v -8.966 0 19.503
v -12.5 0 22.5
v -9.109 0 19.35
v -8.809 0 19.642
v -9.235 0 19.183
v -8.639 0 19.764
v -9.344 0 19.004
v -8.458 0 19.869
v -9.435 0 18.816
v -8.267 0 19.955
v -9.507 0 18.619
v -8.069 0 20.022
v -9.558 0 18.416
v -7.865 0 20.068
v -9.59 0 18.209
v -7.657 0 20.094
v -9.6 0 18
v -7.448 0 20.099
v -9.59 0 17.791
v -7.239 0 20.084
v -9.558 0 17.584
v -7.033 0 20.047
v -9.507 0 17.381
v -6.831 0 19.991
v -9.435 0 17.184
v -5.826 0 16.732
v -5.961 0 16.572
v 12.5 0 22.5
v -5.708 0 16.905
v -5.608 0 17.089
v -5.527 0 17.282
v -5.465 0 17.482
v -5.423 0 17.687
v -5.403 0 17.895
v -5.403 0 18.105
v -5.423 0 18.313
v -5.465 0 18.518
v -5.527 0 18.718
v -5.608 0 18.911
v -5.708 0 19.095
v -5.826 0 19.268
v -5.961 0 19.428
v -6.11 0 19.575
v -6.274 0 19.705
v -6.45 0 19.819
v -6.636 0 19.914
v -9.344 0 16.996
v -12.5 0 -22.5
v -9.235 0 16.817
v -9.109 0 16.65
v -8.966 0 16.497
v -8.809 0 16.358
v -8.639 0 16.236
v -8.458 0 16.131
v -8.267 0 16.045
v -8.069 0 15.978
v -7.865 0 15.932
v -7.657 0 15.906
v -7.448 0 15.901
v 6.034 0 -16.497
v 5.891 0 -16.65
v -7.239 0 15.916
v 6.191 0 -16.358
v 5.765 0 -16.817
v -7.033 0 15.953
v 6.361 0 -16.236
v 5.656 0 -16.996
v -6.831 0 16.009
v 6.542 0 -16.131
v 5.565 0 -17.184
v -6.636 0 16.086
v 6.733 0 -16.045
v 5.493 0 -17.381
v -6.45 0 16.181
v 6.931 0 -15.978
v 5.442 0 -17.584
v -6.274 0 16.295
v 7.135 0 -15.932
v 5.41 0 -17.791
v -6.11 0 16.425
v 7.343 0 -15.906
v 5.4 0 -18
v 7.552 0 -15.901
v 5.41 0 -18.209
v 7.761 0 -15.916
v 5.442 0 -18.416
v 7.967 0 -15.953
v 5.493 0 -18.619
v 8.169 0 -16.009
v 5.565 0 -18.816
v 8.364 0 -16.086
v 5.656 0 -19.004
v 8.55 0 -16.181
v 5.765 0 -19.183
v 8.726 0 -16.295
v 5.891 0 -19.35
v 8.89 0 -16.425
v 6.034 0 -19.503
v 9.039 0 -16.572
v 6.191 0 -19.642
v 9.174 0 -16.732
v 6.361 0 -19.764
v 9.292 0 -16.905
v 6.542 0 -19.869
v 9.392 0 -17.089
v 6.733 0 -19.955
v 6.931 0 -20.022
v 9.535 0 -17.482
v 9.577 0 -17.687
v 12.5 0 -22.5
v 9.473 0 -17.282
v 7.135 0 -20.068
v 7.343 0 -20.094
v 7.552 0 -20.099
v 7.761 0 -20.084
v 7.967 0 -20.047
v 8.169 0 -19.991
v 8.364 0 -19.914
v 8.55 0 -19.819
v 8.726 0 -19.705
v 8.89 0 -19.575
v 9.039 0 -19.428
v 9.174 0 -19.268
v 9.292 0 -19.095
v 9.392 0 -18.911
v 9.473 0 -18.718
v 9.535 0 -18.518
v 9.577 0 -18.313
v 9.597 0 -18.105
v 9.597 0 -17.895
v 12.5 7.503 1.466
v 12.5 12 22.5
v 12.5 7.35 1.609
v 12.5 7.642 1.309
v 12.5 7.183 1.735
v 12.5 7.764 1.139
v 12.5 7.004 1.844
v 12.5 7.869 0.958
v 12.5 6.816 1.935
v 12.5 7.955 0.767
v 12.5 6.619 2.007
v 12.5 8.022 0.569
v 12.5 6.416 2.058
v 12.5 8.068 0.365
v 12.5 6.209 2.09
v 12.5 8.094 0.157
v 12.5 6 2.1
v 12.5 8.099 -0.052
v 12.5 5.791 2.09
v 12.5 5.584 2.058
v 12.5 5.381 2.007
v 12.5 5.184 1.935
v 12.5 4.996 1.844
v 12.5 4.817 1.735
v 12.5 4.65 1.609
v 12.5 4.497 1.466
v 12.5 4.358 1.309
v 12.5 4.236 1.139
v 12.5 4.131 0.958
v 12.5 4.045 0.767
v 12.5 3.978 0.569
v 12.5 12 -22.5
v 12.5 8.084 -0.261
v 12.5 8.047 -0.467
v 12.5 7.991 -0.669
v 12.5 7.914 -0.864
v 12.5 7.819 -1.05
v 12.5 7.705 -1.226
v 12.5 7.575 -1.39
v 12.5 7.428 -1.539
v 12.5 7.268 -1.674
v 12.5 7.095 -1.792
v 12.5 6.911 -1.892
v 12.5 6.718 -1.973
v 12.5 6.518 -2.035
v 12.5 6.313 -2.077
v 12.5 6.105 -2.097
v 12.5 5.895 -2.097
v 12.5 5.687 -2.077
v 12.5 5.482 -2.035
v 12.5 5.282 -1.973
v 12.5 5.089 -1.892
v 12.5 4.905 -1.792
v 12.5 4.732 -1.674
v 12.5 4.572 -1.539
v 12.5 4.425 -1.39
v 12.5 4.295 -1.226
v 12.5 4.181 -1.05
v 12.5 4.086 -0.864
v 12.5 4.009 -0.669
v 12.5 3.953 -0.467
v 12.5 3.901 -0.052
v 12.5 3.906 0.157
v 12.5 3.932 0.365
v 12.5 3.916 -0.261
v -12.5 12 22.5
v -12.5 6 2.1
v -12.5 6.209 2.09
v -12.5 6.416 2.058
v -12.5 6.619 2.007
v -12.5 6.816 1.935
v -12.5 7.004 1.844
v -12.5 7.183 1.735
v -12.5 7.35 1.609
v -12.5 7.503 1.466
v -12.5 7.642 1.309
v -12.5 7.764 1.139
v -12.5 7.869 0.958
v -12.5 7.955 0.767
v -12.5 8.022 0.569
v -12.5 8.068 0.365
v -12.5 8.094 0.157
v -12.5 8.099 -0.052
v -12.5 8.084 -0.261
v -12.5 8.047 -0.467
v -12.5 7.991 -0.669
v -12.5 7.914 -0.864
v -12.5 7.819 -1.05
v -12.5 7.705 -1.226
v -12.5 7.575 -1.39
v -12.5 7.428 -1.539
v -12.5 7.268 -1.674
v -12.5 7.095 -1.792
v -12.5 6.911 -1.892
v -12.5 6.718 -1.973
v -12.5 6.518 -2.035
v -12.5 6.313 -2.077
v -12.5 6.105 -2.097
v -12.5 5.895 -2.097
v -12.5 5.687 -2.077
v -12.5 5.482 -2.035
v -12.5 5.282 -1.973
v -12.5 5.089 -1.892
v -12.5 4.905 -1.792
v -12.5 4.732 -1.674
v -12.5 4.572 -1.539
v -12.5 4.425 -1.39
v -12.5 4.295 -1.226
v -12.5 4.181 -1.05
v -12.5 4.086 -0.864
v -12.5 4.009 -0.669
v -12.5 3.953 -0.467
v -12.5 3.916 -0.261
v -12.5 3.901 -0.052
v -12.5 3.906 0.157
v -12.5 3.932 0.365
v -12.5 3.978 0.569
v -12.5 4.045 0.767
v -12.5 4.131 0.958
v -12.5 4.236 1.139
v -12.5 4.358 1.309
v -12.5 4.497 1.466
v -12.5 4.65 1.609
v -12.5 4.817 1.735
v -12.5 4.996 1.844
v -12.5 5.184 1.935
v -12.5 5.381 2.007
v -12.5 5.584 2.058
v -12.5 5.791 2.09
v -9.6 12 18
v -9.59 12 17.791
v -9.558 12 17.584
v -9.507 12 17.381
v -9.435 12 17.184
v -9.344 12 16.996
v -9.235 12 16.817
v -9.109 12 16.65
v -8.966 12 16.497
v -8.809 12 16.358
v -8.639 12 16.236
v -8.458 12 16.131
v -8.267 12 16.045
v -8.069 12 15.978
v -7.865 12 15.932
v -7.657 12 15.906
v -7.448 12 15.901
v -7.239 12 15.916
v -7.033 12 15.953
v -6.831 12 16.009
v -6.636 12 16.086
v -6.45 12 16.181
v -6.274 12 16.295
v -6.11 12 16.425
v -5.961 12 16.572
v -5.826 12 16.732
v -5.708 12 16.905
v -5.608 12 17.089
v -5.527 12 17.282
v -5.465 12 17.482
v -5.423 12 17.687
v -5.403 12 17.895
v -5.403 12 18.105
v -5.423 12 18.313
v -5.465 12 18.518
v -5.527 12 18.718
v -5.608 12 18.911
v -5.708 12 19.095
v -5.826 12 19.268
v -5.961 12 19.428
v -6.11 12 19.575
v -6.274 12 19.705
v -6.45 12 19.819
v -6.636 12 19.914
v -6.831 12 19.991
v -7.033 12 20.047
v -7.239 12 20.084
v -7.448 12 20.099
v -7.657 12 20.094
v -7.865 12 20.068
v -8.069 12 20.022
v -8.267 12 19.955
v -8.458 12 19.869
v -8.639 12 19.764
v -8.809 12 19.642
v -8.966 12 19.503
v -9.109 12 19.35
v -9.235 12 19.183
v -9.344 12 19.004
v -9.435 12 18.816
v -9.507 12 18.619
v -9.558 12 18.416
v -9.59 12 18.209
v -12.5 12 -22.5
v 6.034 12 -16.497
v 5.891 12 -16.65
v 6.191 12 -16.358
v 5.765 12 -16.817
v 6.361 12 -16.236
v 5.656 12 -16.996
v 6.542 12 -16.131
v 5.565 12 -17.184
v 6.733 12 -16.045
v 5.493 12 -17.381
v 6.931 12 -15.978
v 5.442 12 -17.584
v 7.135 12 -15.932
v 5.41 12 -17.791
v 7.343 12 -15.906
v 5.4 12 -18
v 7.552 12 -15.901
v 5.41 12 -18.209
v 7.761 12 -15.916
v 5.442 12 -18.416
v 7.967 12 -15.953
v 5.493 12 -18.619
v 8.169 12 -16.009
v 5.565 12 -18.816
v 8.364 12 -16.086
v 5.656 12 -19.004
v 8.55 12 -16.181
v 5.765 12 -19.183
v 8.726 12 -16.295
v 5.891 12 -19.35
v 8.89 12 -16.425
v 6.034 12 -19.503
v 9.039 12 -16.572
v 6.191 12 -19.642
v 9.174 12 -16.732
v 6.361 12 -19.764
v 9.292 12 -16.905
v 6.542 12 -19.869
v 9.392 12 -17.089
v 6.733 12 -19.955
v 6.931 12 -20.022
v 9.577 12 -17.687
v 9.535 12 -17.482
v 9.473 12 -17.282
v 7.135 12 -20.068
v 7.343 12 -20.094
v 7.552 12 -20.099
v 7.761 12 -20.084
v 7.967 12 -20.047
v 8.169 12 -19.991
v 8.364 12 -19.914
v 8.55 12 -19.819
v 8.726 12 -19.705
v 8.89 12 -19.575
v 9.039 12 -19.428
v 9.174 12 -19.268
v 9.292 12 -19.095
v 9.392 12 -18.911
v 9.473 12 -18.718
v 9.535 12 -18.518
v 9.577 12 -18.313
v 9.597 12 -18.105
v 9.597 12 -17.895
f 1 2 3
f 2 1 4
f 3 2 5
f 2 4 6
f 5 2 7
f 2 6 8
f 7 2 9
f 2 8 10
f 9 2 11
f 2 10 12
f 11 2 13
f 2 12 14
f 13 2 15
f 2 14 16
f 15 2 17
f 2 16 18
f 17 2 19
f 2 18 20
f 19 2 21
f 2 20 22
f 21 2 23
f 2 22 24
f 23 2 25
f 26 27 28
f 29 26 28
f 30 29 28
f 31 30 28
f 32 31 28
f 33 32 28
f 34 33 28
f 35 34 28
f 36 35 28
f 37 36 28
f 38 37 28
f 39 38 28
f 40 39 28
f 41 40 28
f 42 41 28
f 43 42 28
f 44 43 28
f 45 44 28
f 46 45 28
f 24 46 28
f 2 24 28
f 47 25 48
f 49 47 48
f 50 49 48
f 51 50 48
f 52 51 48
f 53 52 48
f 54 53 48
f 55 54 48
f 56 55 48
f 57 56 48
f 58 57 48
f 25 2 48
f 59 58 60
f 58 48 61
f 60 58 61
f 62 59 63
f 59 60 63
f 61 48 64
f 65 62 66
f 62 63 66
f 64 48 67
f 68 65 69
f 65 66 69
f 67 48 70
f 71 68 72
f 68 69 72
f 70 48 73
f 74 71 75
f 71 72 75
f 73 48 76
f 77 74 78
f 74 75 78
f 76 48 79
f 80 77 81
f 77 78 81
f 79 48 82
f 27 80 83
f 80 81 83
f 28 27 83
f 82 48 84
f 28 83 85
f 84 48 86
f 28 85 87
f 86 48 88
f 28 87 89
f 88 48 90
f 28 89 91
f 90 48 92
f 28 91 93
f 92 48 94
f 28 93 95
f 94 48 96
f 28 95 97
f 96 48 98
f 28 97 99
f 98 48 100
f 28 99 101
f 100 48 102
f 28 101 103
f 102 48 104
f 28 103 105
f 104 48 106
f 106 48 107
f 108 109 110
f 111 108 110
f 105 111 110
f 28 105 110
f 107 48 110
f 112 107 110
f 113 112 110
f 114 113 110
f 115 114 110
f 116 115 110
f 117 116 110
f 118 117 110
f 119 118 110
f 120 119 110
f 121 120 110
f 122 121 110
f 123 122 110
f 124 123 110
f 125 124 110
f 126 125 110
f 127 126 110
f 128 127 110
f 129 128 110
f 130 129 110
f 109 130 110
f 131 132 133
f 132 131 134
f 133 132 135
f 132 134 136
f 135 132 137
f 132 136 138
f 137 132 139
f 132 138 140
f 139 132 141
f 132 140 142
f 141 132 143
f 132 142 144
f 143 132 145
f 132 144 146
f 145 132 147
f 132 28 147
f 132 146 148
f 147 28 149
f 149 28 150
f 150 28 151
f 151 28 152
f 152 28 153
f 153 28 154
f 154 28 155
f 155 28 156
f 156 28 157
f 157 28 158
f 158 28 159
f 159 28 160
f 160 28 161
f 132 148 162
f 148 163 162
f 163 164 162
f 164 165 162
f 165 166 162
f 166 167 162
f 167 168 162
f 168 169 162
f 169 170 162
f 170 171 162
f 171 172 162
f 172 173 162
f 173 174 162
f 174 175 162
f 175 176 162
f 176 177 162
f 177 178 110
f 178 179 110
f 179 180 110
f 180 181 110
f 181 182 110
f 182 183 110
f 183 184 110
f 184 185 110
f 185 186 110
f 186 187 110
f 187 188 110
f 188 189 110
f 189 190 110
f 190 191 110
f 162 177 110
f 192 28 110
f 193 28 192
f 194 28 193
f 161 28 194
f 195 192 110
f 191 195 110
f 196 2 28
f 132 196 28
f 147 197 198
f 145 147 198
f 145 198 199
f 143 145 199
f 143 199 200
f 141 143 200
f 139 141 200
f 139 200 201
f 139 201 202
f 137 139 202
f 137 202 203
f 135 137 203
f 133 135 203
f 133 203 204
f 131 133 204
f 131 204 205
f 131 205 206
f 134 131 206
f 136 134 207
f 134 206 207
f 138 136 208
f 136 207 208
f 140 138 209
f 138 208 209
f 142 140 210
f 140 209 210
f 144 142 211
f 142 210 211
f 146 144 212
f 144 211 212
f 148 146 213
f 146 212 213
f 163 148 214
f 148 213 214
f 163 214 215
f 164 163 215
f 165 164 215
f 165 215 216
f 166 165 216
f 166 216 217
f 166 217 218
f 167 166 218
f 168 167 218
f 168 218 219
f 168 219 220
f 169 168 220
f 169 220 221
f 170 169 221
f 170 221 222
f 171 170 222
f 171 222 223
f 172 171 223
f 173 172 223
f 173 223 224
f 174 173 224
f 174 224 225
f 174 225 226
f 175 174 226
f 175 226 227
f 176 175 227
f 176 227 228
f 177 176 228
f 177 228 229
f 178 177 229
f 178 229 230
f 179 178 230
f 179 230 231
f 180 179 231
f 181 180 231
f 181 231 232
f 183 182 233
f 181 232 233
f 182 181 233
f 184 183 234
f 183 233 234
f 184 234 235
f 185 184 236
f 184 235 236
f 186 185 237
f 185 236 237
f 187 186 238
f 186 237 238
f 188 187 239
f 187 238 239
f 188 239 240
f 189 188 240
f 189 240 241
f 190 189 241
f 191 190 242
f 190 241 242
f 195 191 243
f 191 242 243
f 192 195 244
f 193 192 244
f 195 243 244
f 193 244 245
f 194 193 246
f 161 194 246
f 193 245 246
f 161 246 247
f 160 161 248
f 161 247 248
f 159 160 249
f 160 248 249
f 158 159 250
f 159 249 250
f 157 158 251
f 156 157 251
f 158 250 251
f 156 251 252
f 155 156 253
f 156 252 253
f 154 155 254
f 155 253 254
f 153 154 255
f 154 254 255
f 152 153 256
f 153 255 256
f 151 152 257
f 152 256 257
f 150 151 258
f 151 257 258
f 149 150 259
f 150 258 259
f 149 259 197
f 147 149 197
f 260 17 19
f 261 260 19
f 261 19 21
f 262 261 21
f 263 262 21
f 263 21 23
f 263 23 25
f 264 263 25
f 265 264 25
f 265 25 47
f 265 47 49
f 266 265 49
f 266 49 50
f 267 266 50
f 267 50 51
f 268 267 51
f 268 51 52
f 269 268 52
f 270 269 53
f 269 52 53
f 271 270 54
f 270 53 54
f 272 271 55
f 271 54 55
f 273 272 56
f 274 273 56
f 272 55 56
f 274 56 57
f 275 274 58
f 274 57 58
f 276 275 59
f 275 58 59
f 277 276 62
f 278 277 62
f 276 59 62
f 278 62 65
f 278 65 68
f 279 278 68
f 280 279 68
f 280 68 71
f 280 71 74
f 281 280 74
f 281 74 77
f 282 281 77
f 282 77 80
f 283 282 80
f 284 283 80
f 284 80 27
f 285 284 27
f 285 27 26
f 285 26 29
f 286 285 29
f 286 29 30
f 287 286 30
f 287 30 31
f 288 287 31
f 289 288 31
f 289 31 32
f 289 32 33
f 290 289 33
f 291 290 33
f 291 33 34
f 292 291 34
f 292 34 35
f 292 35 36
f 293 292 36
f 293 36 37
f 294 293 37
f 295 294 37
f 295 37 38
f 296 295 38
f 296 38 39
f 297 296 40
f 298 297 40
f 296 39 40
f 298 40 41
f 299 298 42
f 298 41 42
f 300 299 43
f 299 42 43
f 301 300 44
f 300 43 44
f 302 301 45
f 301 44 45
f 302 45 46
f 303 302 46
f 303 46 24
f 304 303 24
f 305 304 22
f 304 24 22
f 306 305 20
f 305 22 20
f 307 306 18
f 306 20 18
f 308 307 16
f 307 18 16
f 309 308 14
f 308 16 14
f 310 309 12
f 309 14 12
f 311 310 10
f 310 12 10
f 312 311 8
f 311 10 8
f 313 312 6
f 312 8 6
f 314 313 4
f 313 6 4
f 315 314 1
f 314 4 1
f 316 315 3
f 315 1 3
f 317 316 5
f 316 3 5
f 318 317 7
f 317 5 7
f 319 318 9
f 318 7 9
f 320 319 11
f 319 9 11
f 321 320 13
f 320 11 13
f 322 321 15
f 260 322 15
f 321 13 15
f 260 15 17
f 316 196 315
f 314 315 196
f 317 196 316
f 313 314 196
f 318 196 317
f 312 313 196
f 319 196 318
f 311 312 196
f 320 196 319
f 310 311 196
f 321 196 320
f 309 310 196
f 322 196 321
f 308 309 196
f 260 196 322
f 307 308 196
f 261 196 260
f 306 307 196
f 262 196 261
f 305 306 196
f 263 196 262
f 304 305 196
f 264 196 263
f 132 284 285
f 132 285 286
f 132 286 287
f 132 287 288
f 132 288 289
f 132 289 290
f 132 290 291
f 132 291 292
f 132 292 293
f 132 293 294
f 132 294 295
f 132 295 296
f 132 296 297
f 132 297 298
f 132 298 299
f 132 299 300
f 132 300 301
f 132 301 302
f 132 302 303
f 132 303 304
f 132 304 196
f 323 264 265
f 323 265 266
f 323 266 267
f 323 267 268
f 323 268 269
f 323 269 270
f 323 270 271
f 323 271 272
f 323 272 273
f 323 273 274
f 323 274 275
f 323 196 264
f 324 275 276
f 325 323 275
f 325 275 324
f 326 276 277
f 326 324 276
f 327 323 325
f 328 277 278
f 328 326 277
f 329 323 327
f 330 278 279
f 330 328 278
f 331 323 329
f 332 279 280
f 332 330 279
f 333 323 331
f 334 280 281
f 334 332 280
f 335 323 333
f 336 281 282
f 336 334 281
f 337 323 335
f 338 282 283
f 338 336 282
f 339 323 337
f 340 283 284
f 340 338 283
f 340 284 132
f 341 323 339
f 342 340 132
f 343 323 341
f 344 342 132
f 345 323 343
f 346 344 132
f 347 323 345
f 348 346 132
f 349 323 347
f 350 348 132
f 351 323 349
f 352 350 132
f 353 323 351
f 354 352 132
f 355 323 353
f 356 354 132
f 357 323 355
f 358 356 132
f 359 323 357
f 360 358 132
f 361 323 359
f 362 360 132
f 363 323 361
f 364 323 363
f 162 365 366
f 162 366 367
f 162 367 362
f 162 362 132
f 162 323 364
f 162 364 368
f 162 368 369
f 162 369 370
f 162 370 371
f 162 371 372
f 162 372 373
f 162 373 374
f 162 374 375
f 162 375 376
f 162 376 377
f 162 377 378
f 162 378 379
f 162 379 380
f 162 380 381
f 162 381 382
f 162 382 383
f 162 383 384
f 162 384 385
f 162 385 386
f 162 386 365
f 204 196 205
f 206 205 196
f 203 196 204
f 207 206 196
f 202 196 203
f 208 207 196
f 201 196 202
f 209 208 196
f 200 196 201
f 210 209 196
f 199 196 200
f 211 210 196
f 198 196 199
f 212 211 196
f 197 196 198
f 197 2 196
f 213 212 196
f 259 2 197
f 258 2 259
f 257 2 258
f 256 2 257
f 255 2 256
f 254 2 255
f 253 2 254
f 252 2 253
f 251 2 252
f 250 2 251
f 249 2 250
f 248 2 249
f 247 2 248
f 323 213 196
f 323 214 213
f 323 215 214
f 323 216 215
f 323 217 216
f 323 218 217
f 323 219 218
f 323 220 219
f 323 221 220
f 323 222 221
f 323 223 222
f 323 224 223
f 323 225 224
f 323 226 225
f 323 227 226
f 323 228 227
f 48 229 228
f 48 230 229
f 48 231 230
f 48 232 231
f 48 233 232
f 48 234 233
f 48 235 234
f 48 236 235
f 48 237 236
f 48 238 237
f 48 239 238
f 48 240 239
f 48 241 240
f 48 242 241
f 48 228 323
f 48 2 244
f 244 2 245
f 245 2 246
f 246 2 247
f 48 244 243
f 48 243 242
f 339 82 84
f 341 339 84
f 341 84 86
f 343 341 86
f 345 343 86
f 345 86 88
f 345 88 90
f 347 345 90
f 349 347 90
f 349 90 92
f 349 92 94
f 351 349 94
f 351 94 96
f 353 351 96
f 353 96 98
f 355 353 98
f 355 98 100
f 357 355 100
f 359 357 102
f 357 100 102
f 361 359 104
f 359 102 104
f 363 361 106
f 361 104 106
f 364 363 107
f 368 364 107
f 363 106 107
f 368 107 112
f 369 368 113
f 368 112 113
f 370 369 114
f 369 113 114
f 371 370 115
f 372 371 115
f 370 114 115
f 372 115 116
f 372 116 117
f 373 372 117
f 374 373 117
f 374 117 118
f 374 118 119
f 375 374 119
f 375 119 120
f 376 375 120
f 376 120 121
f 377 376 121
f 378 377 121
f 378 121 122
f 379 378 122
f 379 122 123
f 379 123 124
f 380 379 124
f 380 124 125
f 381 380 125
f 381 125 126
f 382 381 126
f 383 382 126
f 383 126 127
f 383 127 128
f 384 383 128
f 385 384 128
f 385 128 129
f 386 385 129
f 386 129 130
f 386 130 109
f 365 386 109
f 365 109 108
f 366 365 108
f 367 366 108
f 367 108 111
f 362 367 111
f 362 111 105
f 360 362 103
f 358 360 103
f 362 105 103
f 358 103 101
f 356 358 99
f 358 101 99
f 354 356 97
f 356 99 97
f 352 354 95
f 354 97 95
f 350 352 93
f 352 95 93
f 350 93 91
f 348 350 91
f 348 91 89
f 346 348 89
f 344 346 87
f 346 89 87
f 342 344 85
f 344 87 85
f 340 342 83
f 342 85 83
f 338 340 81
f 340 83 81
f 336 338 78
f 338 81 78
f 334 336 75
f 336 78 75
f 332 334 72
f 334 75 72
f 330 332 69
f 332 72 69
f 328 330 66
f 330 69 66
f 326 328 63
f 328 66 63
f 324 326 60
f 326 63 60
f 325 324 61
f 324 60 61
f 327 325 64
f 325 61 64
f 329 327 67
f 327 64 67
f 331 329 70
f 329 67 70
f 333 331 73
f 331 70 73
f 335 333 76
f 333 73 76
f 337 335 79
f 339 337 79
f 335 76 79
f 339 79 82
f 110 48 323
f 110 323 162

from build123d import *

# Parameters (mm, degrees)
SKETCH1_W           = 25
SKETCH1_H           = 45
BOSS_EXTRUDE1_DEPTH = 12
M5_TAPPED_HOLE1_D   = 4.2
M5_TAPPED_HOLE2_D   = 4.2


with BuildPart() as part:
    # Sketch1 → Boss-Extrude1 (new body)
    with BuildSketch(Plane(origin=(0, 0, 0), x_dir=(1, 0, 0), z_dir=(0, 1, 0))):
        Rectangle(SKETCH1_W, SKETCH1_H)
    extrude(amount=BOSS_EXTRUDE1_DEPTH)

    # M5 Tapped Hole1 (through all)
    with Locations(Plane(origin=(0, 12, 0), x_dir=(1, 0, 0), z_dir=(0, 1, 0))):
        with Locations((7.5, 18), (-7.5, -18)):
            Hole(M5_TAPPED_HOLE1_D / 2)

    # M5 Tapped Hole2 (through all)
    with Locations(Plane(origin=(12.5, 0, 0), x_dir=(0, 0, -1), z_dir=(1, 0, 0))):
        with Locations((0, 6)):
            Hole(M5_TAPPED_HOLE2_D / 2)


solid = part.part
